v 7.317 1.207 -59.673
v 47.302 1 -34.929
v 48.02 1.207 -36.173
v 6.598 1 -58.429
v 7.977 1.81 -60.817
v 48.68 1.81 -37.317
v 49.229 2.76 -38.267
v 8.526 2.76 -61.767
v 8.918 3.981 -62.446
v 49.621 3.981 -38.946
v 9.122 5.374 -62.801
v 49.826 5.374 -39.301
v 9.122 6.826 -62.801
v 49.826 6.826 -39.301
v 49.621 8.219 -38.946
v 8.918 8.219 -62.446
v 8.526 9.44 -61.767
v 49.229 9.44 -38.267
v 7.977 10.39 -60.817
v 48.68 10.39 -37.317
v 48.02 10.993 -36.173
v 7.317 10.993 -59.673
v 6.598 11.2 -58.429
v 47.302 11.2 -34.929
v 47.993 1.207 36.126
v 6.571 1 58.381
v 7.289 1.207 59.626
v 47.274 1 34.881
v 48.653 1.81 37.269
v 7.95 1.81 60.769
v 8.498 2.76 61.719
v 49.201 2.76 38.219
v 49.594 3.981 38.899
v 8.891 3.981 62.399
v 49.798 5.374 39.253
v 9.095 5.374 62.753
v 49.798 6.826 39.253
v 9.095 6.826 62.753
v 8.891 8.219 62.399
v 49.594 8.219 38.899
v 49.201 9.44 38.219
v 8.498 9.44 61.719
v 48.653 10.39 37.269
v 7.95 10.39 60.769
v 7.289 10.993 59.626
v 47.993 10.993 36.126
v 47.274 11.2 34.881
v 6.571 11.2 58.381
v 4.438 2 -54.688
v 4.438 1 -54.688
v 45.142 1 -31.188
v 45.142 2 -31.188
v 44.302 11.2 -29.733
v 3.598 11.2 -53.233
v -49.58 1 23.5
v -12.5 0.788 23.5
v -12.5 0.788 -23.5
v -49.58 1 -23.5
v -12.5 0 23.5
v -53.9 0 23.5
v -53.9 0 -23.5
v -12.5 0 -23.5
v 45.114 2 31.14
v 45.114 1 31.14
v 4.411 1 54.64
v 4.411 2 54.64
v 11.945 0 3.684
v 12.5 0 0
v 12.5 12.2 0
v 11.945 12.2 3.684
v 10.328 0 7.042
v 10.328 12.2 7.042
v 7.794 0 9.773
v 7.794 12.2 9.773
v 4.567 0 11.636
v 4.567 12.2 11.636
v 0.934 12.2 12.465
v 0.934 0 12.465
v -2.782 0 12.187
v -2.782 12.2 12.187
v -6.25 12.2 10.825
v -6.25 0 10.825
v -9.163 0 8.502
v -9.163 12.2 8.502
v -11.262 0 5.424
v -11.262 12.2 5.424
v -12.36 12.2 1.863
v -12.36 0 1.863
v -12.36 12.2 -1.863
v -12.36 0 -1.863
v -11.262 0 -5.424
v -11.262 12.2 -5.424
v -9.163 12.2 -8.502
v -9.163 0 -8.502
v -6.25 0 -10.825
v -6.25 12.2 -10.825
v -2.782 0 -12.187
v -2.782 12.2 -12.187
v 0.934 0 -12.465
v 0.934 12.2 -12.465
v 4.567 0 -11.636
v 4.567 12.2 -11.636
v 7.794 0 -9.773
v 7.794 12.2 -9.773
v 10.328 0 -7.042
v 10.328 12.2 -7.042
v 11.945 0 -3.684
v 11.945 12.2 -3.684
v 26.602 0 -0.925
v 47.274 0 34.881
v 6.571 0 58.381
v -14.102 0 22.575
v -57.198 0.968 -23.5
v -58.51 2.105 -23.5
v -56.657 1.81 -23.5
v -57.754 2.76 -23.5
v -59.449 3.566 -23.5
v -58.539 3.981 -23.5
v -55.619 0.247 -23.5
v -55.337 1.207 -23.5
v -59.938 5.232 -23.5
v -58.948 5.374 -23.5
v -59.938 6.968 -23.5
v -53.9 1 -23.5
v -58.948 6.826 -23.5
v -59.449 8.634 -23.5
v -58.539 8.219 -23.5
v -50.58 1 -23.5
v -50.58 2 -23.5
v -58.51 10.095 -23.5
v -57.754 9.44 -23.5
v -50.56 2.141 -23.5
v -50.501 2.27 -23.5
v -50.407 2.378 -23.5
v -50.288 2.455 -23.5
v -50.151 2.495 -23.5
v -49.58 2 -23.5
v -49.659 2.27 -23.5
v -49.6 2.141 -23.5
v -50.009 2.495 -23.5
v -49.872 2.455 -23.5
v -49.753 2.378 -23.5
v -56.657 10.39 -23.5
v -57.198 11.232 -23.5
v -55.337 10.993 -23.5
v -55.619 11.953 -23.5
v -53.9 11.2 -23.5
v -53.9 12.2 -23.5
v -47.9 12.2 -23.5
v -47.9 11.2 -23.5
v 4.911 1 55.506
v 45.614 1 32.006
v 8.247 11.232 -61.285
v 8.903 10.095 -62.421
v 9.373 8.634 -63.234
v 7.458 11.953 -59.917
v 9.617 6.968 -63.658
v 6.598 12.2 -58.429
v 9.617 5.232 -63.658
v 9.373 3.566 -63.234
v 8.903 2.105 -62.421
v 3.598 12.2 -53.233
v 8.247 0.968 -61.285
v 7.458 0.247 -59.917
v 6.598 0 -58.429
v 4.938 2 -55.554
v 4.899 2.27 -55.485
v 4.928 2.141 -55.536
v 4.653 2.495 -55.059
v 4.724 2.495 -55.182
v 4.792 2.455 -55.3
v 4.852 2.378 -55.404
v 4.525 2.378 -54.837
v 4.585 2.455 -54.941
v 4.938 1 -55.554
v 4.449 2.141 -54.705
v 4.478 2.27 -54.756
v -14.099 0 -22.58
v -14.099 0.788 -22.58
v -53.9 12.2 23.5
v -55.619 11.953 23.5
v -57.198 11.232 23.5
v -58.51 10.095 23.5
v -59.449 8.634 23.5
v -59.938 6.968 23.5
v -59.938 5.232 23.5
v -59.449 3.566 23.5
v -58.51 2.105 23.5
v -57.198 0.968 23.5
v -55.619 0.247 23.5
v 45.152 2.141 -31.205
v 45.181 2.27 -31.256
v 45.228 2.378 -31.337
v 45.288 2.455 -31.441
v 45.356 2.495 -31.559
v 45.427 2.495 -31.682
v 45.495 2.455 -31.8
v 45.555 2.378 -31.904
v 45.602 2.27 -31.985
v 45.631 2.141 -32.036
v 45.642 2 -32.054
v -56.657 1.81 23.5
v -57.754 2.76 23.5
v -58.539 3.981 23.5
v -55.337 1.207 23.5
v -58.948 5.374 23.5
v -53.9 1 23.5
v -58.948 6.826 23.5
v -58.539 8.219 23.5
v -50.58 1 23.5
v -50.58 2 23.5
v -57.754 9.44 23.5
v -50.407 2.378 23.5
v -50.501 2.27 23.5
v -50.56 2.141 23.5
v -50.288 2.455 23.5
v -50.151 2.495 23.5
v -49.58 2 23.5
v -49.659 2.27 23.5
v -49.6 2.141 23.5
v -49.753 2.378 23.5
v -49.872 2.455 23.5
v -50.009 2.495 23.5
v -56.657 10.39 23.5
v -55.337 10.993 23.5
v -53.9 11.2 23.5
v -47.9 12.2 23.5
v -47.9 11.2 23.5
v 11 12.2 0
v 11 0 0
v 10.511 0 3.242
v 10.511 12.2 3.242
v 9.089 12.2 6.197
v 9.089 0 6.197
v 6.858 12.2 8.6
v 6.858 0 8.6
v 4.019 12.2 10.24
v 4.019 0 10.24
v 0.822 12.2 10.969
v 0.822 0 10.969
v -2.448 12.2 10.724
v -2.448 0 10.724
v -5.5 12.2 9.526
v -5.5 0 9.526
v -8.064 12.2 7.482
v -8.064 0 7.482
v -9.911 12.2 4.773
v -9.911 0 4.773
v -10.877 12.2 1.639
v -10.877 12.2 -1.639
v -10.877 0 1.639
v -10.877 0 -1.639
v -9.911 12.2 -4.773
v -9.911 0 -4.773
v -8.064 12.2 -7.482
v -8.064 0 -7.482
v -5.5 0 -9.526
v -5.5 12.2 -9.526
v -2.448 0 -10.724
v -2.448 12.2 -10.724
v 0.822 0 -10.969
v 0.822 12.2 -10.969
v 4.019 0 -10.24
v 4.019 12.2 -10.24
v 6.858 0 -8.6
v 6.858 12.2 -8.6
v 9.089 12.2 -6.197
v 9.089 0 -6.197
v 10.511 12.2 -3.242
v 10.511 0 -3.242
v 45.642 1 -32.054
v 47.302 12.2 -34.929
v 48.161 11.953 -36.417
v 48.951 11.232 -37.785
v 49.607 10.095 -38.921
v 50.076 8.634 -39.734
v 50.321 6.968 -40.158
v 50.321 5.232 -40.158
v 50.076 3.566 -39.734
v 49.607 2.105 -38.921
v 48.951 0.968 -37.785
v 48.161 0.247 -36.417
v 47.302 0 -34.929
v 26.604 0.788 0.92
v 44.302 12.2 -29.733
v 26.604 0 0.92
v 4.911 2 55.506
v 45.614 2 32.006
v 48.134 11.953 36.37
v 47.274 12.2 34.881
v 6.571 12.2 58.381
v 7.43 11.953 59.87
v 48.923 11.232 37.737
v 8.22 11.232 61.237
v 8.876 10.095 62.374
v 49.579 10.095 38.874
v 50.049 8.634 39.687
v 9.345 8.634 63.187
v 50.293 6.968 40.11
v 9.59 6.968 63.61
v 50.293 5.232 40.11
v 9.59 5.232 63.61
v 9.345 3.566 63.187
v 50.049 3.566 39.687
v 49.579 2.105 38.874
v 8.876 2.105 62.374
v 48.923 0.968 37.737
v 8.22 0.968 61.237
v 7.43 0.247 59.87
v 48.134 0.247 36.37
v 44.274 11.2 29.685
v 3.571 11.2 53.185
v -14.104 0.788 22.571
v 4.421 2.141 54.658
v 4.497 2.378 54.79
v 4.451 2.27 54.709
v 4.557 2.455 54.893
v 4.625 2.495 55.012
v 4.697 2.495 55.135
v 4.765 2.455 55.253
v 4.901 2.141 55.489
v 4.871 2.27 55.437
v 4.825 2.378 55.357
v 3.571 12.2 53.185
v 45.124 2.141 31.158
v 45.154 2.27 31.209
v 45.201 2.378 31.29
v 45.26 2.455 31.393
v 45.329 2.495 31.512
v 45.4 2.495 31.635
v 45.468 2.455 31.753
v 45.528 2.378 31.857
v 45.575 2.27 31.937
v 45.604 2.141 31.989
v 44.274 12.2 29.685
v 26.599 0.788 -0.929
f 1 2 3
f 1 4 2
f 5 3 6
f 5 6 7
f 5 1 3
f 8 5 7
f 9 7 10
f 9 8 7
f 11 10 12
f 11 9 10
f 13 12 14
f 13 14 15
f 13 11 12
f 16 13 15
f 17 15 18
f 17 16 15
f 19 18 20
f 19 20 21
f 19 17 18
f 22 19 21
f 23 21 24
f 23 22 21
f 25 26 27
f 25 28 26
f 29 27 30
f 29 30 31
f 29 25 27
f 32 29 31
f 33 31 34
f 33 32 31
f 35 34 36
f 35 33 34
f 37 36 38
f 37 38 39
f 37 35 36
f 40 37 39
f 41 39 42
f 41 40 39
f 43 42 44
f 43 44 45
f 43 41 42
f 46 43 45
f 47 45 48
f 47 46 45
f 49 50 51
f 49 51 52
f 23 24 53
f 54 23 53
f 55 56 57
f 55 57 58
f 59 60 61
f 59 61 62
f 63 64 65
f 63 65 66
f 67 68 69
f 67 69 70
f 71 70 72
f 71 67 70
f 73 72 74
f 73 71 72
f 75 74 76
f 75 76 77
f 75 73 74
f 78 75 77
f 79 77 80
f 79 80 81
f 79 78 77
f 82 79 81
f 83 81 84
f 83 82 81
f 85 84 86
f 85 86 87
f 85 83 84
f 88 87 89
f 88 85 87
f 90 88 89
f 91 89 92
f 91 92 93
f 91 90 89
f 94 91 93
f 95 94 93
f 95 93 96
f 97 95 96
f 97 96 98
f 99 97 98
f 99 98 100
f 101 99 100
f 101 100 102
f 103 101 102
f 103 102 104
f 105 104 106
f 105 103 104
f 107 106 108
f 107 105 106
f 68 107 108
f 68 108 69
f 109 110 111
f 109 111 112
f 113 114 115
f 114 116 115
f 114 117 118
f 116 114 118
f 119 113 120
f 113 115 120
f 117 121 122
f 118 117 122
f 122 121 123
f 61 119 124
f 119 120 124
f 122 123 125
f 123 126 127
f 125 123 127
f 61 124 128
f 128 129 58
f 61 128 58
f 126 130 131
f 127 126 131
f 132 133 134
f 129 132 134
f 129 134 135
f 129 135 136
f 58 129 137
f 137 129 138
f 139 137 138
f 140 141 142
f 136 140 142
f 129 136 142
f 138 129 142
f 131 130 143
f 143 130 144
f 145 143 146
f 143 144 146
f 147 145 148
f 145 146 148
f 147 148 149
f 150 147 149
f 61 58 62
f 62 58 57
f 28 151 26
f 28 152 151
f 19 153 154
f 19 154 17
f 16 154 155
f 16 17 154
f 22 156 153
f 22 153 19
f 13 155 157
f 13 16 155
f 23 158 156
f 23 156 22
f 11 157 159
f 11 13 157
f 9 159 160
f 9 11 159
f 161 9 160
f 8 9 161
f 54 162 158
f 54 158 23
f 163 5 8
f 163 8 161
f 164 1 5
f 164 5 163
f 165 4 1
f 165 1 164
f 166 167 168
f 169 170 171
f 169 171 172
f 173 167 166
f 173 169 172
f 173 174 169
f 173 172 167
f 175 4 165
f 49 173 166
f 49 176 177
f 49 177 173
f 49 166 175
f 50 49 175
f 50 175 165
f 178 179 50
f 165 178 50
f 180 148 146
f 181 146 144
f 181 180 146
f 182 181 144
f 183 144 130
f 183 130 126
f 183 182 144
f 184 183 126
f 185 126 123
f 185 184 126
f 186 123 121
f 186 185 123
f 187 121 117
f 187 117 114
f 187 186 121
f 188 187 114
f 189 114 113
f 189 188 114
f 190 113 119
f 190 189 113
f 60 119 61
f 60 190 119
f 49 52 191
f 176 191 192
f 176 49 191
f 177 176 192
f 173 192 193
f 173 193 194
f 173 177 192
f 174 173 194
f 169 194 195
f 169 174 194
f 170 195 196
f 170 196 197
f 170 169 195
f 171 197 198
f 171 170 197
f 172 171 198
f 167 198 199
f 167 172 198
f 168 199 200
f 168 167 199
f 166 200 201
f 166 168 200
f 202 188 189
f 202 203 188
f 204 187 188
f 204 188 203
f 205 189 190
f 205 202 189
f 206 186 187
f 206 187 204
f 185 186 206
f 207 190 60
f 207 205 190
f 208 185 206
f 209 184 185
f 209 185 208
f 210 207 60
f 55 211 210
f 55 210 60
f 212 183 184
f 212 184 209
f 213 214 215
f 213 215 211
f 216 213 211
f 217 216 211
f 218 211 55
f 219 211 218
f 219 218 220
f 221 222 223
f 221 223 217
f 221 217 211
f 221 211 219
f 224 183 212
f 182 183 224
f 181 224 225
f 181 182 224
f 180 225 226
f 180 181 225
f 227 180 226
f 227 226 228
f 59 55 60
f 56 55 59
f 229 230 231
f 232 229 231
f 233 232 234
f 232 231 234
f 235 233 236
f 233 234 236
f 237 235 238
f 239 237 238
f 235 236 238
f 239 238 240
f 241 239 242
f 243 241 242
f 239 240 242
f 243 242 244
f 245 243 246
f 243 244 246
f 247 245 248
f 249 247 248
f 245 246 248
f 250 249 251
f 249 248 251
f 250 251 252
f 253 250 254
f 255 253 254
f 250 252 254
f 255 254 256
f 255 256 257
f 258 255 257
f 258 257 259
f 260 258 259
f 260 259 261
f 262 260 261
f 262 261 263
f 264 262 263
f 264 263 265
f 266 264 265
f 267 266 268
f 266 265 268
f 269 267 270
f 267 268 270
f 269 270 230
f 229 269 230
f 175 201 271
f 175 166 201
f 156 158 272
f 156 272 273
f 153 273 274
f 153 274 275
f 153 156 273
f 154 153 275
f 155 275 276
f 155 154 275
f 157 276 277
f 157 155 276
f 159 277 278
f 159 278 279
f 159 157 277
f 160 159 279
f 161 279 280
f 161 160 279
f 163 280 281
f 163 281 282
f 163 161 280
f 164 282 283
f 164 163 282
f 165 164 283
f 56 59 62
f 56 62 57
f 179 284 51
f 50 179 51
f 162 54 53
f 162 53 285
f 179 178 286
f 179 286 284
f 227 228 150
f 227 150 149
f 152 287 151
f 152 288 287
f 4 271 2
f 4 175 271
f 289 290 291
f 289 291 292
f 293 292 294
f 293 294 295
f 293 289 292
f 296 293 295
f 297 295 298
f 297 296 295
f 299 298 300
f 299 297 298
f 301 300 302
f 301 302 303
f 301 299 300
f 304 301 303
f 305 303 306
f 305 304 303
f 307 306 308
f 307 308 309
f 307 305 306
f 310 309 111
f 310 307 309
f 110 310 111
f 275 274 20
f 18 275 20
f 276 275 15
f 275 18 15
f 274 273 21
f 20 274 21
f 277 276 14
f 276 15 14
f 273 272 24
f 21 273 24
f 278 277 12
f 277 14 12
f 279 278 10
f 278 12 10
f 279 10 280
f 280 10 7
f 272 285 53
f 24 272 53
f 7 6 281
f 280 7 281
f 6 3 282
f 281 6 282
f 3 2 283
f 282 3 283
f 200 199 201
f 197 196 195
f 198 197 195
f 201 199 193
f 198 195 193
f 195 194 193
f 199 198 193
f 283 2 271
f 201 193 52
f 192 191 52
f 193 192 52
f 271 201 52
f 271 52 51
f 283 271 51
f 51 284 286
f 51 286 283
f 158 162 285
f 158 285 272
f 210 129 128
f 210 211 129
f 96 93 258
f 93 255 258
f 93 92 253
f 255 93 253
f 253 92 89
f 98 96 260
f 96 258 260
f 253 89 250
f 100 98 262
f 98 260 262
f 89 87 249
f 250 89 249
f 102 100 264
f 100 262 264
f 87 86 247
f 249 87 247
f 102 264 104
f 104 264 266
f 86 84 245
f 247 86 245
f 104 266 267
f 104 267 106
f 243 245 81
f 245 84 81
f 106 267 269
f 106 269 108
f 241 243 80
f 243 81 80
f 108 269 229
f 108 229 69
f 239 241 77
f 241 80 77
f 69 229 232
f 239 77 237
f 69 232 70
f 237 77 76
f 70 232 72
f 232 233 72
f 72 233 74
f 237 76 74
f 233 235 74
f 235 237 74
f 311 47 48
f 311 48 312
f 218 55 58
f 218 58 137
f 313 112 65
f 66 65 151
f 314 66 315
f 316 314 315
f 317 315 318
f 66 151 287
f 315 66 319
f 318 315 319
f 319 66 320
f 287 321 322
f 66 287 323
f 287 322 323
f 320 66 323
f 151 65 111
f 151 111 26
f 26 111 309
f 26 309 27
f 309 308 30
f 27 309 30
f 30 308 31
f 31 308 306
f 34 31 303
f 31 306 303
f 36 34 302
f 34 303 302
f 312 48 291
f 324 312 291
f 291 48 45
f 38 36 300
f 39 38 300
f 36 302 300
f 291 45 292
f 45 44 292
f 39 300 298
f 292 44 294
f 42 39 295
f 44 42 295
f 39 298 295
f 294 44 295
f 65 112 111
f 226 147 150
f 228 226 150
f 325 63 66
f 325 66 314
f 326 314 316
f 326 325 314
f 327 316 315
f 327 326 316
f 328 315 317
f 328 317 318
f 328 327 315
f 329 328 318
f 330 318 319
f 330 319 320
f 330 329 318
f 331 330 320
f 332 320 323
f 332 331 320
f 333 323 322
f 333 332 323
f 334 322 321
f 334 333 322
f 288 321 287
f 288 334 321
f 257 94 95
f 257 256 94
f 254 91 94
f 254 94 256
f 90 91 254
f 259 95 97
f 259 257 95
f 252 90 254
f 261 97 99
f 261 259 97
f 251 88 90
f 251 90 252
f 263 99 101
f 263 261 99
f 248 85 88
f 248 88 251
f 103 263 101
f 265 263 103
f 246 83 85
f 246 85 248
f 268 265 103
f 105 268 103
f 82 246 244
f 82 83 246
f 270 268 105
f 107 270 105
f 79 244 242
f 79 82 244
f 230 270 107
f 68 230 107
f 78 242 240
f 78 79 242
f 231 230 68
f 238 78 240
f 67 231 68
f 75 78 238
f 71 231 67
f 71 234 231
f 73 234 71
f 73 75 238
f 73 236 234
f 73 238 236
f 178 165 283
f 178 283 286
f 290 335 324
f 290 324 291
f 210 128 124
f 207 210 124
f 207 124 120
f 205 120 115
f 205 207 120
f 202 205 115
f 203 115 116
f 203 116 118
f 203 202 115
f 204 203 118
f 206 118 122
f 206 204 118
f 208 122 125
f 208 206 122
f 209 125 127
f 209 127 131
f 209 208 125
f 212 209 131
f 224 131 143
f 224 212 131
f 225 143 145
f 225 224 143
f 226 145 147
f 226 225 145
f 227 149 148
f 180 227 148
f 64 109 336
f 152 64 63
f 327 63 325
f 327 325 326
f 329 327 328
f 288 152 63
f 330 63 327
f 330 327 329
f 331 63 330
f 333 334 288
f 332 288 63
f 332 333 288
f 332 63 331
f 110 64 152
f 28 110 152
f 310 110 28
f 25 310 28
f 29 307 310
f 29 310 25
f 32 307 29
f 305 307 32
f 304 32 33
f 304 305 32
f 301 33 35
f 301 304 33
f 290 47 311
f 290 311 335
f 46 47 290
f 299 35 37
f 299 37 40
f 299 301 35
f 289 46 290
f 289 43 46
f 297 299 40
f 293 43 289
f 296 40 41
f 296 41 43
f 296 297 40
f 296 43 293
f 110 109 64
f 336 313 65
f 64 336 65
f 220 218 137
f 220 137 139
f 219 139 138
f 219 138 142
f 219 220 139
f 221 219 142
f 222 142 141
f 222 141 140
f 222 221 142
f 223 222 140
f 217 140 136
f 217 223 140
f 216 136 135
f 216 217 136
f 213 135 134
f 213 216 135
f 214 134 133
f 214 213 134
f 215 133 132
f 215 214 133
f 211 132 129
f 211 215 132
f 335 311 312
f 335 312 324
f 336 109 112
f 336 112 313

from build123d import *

# Parameters (mm, degrees)
F0_R      = 12.5
F0_R_2    = 11
F1_DEPTH  = 12.2
F3_DEPTH  = 23.5
F7_DEPTH  = 23.5
F11_DEPTH = 23.5
F13_R     = 11
F14_DEPTH = 25


with BuildPart() as f1:
    # F0 (on Front) → F1 (new body)
    with BuildSketch(Plane.XZ):
        Circle(F0_R)
        Circle(F0_R_2, mode=Mode.SUBTRACT)
    extrude(amount=-F1_DEPTH)

    # F13 (on offset) → F14 (cut)
    with BuildSketch(Plane.XZ.offset(-12.2)):
        Circle(F13_R)
    extrude(amount=F14_DEPTH, mode=Mode.SUBTRACT)


with BuildPart() as f3:
    # F2 (on Top) → F3 (new body, symmetric)
    with BuildSketch(Plane.XY):
        with BuildLine():
            ThreePointArc((-53.9000045358, 1), (-59.0000045358, 6.1), (-53.9000045358, 11.2))
            Line((-53.9000045358, 11.2), (-47.9000045358, 11.2))
            Line((-47.9000045358, 11.2), (-47.9000045358, 12.2))
            Line((-47.9000045358, 12.2), (-53.9000045358, 12.2))
            ThreePointArc((-53.9000045358, 12.2), (-60.0000045358, 6.1), (-53.9000045358, 0))
            Line((-53.9000045358, 0), (-49.58, 0))
            Line((-49.58, 0), (-12.5, 0))
            Line((-12.5, 0), (-12.5, 0.7875138404))
            Line((-12.5, 0.7875138404), (-49.58, 1))
            Line((-49.58, 1), (-49.58, 2))
            ThreePointArc((-49.58, 2), (-50.08, 2.5), (-50.58, 2))
            Line((-50.58, 2), (-50.58, 1))
            Line((-50.58, 1), (-53.9000045358, 1))
        make_face()
    extrude(amount=F3_DEPTH, both=True)


with BuildPart() as f7:
    # F6 (on line) → F7 (new body, symmetric)
    with BuildSketch(Plane(origin=(0, 0, 0), x_dir=(0, -1, 0), z_dir=(-0.8660254038, 0, -0.5))):
        with BuildLine():
            ThreePointArc((-1, -53.9000045358), (-6.1, -59.0000045358), (-11.2, -53.9000045358))
            Line((-11.2, -53.9000045358), (-11.2, -47.9000045358))
            Line((-11.2, -47.9000045358), (-12.2, -47.9000045358))
            Line((-12.2, -47.9000045358), (-12.2, -53.9000045358))
            ThreePointArc((-12.2, -53.9000045358), (-6.1, -60.0000045358), (0, -53.9000045358))
            Line((0, -53.9000045358), (0, -49.58))
            Line((0, -49.58), (0, -12.5055553867))
            Line((0, -12.5055553867), (-0.7875456754, -12.5055553867))
            Line((-0.7875456754, -12.5055553867), (-1, -49.58))
            Line((-1, -49.58), (-2, -49.58))
            ThreePointArc((-2, -49.58), (-2.5, -50.08), (-2, -50.58))
            Line((-2, -50.58), (-1, -50.58))
            Line((-1, -50.58), (-1, -53.9000045358))
        make_face()
    extrude(amount=F7_DEPTH, both=True)


with BuildPart() as f11:
    # F10 (on line) → F11 (new body, symmetric)
    with BuildSketch(Plane(origin=(0, 0, 0), x_dir=(0, 1, 0), z_dir=(0.8660254038, 0, -0.5))):
        with BuildLine():
            ThreePointArc((1, 53.845282644), (6.1, 58.945282644), (11.2, 53.845282644))
            Line((11.2, 53.845282644), (11.2, 47.845282644))
            Line((11.2, 47.845282644), (12.2, 47.845282644))
            Line((12.2, 47.845282644), (12.2, 53.845282644))
            ThreePointArc((12.2, 53.845282644), (6.1, 59.945282644), (0, 53.845282644))
            Line((0, 53.845282644), (0, 49.5252781083))
            Line((0, 49.5252781083), (0, 12.5))
            Line((0, 12.5), (0.7878015529, 12.4954855198))
            Line((0.7878015529, 12.4954855198), (1, 49.5252781083))
            Line((1, 49.5252781083), (2, 49.5252781083))
            ThreePointArc((2, 49.5252781083), (2.5, 50.0252781083), (2, 50.5252781083))
            Line((2, 50.5252781083), (1, 50.5252781083))
            Line((1, 50.5252781083), (1, 53.845282644))
        make_face()
    extrude(amount=F11_DEPTH, both=True)


solid = Compound([f1.part, f3.part, f7.part, f11.part])
